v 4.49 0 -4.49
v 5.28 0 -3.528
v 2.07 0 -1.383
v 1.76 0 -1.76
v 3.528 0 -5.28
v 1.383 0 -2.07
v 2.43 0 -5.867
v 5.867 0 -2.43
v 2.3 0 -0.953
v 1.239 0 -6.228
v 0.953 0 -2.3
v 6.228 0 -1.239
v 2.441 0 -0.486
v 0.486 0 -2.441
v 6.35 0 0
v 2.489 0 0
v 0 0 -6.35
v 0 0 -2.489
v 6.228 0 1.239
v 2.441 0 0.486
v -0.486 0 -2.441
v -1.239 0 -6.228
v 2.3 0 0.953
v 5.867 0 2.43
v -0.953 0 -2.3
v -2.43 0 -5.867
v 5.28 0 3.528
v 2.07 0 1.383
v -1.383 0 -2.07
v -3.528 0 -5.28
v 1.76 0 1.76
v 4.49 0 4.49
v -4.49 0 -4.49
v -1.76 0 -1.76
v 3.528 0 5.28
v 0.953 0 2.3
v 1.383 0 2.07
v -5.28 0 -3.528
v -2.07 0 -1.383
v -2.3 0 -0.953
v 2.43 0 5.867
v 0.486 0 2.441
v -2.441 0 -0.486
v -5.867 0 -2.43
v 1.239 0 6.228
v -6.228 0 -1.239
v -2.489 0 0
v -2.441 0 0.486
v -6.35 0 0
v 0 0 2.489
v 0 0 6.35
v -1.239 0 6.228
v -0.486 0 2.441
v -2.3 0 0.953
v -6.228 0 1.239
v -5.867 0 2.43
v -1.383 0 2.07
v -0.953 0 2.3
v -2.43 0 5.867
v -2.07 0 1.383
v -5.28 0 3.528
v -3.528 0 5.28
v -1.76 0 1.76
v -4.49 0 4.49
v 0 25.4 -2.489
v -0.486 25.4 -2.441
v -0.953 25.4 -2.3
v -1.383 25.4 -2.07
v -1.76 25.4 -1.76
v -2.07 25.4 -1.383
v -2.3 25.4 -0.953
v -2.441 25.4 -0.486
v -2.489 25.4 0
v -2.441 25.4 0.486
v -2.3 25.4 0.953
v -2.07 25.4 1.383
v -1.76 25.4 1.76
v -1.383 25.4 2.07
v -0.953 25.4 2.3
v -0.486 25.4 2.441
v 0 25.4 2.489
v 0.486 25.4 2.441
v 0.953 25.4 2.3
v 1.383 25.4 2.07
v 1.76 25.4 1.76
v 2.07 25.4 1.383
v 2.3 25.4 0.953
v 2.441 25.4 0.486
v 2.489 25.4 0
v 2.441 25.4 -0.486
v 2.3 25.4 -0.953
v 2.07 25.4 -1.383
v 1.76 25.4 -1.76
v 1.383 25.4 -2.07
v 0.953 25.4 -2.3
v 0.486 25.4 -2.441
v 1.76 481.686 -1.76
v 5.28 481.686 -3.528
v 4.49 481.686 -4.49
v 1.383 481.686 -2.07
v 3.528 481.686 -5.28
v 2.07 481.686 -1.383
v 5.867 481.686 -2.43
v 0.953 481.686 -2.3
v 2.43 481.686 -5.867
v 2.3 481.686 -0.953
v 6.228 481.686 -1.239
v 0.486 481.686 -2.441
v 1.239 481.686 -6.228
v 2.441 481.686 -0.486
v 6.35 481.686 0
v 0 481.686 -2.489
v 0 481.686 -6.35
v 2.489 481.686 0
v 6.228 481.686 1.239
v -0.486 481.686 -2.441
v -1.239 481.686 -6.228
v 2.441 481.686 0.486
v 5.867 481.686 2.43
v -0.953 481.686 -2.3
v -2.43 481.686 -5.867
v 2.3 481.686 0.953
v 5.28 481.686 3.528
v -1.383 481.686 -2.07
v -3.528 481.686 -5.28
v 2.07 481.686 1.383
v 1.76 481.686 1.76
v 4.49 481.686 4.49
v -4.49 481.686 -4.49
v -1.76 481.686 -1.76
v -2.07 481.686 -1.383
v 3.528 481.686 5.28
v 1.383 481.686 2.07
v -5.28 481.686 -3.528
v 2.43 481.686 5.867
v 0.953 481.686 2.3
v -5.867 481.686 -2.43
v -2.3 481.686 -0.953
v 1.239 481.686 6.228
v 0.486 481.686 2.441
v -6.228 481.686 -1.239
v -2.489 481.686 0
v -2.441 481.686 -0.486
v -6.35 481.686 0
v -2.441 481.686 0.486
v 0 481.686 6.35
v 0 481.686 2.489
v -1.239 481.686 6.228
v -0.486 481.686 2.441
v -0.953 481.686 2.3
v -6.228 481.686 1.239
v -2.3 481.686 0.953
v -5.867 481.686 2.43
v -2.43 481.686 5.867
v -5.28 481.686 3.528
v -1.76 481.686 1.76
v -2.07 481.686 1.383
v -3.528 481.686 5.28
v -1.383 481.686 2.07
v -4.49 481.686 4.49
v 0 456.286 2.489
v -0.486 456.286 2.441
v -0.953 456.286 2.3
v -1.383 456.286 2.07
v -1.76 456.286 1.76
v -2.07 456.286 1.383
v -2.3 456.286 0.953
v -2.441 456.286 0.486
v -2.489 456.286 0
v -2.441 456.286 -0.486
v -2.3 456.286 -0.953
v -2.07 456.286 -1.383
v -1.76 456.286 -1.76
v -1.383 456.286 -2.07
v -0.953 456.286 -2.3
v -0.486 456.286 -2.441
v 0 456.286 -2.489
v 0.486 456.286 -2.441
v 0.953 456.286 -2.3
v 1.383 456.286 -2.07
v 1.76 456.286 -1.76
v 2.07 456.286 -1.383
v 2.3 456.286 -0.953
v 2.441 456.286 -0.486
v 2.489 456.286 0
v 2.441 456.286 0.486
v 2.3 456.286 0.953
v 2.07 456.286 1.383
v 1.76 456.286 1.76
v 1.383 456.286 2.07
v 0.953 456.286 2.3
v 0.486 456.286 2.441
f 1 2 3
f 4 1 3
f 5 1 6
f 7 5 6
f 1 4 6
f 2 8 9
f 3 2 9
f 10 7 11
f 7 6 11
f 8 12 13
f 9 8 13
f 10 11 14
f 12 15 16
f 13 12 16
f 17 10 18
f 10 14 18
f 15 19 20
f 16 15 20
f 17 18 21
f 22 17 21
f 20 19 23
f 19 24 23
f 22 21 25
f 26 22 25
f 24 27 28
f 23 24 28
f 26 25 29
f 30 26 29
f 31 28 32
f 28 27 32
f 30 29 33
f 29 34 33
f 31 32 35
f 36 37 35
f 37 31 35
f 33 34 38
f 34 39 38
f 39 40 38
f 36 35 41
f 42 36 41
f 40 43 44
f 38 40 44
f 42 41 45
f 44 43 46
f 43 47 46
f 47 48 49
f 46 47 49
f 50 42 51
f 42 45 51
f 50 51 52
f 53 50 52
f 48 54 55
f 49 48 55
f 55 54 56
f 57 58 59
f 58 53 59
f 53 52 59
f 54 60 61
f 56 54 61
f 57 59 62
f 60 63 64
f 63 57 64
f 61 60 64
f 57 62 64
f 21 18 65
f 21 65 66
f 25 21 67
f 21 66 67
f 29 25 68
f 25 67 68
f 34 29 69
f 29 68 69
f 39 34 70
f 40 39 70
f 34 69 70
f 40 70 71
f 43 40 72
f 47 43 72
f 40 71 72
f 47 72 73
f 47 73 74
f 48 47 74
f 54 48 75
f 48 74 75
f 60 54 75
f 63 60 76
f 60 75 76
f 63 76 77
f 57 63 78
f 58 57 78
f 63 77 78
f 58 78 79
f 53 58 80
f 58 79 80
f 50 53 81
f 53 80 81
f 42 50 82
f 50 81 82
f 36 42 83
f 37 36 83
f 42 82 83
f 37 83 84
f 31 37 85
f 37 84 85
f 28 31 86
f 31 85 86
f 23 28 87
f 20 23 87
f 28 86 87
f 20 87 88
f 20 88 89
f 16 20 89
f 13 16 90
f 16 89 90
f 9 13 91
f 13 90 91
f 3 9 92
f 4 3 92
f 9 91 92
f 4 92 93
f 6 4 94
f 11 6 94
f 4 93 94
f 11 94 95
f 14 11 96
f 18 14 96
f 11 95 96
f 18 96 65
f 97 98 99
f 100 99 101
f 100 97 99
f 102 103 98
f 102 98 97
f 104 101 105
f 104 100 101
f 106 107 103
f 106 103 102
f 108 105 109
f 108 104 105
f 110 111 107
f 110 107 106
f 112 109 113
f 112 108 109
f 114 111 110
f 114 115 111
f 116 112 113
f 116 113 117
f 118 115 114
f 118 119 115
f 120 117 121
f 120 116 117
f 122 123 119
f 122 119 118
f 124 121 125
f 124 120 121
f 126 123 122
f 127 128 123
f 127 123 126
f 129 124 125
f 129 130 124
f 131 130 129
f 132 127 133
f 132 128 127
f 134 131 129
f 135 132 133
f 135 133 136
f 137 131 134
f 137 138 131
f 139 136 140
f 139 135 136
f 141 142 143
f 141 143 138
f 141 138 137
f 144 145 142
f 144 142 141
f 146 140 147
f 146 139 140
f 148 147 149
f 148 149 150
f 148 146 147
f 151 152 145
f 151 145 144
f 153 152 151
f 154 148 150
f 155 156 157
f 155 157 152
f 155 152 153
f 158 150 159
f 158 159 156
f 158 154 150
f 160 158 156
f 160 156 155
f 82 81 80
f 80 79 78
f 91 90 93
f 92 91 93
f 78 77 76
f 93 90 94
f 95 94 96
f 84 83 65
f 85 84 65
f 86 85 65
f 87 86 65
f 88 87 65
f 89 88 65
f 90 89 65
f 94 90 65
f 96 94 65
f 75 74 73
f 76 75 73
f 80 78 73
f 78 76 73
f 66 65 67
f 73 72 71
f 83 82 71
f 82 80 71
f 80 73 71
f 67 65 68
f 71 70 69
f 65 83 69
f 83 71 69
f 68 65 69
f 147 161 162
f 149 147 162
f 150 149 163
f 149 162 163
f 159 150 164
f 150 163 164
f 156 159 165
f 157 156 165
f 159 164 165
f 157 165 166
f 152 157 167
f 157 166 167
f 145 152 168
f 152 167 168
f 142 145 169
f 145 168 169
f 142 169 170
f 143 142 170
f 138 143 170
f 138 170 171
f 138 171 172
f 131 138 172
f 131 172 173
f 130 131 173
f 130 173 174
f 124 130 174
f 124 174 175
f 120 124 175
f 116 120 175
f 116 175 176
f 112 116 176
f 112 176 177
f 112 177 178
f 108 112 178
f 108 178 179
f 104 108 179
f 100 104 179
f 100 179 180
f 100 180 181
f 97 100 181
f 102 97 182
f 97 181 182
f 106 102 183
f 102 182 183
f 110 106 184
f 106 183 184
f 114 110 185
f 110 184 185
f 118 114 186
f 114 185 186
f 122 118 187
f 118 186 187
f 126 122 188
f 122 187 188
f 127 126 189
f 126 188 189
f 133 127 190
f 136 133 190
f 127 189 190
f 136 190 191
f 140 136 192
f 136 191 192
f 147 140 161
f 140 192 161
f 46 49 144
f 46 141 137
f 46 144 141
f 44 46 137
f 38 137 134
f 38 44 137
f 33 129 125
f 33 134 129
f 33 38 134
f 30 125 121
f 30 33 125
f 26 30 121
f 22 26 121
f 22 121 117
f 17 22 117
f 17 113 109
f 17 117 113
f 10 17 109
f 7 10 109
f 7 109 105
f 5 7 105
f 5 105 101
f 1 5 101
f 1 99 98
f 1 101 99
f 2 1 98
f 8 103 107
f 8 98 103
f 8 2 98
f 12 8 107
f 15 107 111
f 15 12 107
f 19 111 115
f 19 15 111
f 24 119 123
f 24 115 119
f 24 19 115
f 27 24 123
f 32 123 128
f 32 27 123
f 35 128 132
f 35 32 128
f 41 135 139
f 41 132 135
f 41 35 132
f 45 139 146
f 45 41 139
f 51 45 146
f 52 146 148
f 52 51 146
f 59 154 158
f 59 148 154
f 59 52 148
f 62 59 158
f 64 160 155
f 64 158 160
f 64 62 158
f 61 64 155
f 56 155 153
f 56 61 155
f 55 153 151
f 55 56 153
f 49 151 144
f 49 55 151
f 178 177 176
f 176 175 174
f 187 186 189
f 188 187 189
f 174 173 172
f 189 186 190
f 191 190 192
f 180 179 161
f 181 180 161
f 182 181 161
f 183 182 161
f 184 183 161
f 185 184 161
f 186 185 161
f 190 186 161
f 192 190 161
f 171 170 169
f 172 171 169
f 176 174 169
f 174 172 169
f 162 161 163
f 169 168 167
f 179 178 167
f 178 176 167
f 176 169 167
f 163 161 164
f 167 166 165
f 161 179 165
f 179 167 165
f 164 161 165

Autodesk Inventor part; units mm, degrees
ref_plane "YZ Plane" through (0, 0, 0) normal (1, 0, 0) x (0, 1, 0)
ref_plane "XZ Plane" through (0, 0, 0) normal (0, 1, 0) x (-1, 0, 0)
ref_plane "XY Plane" through (0, 0, 0) normal (0, 0, 1) x (1, 0, 0)
sketch "Sketch1" plane through (0, 0, 0) normal (0, 1, 0) x (-1, 0, 0)
  circle A0 centre (0, 0) radius 6.35
  dimension "d0" = 12.7
extrude "Extrusion1" add sketch "Sketch1" along normal blind 481.6856
sketch "Sketch2" plane through (0, 0, 0) normal (0, -1, 0) x (1, 0, 0)
  point P0 (0, 0)
  point P1 (0, 0)
hole "Hole1" at (0, 0, 0) direction (0, 1, 0) diameter 4.9784 depth 25.4 thread size "1/4-20 UNC" class "2B" standard "ANSI Unified Screw Threads"
sketch "Sketch3" plane through (0, 481.6856, 0) normal (0, 1, 0) x (1, 0, 0)
  point P0 (0, 0)
  point P1 (0, 0)
hole "Hole2" at (0, 481.6856, 0) direction (0, -1, 0) diameter 4.9784 depth 25.4 thread size "1/4-20 UNC" class "2B" standard "ANSI Unified Screw Threads"
properties part number "Intake BeaterBar" material "Aluminum 7075"
